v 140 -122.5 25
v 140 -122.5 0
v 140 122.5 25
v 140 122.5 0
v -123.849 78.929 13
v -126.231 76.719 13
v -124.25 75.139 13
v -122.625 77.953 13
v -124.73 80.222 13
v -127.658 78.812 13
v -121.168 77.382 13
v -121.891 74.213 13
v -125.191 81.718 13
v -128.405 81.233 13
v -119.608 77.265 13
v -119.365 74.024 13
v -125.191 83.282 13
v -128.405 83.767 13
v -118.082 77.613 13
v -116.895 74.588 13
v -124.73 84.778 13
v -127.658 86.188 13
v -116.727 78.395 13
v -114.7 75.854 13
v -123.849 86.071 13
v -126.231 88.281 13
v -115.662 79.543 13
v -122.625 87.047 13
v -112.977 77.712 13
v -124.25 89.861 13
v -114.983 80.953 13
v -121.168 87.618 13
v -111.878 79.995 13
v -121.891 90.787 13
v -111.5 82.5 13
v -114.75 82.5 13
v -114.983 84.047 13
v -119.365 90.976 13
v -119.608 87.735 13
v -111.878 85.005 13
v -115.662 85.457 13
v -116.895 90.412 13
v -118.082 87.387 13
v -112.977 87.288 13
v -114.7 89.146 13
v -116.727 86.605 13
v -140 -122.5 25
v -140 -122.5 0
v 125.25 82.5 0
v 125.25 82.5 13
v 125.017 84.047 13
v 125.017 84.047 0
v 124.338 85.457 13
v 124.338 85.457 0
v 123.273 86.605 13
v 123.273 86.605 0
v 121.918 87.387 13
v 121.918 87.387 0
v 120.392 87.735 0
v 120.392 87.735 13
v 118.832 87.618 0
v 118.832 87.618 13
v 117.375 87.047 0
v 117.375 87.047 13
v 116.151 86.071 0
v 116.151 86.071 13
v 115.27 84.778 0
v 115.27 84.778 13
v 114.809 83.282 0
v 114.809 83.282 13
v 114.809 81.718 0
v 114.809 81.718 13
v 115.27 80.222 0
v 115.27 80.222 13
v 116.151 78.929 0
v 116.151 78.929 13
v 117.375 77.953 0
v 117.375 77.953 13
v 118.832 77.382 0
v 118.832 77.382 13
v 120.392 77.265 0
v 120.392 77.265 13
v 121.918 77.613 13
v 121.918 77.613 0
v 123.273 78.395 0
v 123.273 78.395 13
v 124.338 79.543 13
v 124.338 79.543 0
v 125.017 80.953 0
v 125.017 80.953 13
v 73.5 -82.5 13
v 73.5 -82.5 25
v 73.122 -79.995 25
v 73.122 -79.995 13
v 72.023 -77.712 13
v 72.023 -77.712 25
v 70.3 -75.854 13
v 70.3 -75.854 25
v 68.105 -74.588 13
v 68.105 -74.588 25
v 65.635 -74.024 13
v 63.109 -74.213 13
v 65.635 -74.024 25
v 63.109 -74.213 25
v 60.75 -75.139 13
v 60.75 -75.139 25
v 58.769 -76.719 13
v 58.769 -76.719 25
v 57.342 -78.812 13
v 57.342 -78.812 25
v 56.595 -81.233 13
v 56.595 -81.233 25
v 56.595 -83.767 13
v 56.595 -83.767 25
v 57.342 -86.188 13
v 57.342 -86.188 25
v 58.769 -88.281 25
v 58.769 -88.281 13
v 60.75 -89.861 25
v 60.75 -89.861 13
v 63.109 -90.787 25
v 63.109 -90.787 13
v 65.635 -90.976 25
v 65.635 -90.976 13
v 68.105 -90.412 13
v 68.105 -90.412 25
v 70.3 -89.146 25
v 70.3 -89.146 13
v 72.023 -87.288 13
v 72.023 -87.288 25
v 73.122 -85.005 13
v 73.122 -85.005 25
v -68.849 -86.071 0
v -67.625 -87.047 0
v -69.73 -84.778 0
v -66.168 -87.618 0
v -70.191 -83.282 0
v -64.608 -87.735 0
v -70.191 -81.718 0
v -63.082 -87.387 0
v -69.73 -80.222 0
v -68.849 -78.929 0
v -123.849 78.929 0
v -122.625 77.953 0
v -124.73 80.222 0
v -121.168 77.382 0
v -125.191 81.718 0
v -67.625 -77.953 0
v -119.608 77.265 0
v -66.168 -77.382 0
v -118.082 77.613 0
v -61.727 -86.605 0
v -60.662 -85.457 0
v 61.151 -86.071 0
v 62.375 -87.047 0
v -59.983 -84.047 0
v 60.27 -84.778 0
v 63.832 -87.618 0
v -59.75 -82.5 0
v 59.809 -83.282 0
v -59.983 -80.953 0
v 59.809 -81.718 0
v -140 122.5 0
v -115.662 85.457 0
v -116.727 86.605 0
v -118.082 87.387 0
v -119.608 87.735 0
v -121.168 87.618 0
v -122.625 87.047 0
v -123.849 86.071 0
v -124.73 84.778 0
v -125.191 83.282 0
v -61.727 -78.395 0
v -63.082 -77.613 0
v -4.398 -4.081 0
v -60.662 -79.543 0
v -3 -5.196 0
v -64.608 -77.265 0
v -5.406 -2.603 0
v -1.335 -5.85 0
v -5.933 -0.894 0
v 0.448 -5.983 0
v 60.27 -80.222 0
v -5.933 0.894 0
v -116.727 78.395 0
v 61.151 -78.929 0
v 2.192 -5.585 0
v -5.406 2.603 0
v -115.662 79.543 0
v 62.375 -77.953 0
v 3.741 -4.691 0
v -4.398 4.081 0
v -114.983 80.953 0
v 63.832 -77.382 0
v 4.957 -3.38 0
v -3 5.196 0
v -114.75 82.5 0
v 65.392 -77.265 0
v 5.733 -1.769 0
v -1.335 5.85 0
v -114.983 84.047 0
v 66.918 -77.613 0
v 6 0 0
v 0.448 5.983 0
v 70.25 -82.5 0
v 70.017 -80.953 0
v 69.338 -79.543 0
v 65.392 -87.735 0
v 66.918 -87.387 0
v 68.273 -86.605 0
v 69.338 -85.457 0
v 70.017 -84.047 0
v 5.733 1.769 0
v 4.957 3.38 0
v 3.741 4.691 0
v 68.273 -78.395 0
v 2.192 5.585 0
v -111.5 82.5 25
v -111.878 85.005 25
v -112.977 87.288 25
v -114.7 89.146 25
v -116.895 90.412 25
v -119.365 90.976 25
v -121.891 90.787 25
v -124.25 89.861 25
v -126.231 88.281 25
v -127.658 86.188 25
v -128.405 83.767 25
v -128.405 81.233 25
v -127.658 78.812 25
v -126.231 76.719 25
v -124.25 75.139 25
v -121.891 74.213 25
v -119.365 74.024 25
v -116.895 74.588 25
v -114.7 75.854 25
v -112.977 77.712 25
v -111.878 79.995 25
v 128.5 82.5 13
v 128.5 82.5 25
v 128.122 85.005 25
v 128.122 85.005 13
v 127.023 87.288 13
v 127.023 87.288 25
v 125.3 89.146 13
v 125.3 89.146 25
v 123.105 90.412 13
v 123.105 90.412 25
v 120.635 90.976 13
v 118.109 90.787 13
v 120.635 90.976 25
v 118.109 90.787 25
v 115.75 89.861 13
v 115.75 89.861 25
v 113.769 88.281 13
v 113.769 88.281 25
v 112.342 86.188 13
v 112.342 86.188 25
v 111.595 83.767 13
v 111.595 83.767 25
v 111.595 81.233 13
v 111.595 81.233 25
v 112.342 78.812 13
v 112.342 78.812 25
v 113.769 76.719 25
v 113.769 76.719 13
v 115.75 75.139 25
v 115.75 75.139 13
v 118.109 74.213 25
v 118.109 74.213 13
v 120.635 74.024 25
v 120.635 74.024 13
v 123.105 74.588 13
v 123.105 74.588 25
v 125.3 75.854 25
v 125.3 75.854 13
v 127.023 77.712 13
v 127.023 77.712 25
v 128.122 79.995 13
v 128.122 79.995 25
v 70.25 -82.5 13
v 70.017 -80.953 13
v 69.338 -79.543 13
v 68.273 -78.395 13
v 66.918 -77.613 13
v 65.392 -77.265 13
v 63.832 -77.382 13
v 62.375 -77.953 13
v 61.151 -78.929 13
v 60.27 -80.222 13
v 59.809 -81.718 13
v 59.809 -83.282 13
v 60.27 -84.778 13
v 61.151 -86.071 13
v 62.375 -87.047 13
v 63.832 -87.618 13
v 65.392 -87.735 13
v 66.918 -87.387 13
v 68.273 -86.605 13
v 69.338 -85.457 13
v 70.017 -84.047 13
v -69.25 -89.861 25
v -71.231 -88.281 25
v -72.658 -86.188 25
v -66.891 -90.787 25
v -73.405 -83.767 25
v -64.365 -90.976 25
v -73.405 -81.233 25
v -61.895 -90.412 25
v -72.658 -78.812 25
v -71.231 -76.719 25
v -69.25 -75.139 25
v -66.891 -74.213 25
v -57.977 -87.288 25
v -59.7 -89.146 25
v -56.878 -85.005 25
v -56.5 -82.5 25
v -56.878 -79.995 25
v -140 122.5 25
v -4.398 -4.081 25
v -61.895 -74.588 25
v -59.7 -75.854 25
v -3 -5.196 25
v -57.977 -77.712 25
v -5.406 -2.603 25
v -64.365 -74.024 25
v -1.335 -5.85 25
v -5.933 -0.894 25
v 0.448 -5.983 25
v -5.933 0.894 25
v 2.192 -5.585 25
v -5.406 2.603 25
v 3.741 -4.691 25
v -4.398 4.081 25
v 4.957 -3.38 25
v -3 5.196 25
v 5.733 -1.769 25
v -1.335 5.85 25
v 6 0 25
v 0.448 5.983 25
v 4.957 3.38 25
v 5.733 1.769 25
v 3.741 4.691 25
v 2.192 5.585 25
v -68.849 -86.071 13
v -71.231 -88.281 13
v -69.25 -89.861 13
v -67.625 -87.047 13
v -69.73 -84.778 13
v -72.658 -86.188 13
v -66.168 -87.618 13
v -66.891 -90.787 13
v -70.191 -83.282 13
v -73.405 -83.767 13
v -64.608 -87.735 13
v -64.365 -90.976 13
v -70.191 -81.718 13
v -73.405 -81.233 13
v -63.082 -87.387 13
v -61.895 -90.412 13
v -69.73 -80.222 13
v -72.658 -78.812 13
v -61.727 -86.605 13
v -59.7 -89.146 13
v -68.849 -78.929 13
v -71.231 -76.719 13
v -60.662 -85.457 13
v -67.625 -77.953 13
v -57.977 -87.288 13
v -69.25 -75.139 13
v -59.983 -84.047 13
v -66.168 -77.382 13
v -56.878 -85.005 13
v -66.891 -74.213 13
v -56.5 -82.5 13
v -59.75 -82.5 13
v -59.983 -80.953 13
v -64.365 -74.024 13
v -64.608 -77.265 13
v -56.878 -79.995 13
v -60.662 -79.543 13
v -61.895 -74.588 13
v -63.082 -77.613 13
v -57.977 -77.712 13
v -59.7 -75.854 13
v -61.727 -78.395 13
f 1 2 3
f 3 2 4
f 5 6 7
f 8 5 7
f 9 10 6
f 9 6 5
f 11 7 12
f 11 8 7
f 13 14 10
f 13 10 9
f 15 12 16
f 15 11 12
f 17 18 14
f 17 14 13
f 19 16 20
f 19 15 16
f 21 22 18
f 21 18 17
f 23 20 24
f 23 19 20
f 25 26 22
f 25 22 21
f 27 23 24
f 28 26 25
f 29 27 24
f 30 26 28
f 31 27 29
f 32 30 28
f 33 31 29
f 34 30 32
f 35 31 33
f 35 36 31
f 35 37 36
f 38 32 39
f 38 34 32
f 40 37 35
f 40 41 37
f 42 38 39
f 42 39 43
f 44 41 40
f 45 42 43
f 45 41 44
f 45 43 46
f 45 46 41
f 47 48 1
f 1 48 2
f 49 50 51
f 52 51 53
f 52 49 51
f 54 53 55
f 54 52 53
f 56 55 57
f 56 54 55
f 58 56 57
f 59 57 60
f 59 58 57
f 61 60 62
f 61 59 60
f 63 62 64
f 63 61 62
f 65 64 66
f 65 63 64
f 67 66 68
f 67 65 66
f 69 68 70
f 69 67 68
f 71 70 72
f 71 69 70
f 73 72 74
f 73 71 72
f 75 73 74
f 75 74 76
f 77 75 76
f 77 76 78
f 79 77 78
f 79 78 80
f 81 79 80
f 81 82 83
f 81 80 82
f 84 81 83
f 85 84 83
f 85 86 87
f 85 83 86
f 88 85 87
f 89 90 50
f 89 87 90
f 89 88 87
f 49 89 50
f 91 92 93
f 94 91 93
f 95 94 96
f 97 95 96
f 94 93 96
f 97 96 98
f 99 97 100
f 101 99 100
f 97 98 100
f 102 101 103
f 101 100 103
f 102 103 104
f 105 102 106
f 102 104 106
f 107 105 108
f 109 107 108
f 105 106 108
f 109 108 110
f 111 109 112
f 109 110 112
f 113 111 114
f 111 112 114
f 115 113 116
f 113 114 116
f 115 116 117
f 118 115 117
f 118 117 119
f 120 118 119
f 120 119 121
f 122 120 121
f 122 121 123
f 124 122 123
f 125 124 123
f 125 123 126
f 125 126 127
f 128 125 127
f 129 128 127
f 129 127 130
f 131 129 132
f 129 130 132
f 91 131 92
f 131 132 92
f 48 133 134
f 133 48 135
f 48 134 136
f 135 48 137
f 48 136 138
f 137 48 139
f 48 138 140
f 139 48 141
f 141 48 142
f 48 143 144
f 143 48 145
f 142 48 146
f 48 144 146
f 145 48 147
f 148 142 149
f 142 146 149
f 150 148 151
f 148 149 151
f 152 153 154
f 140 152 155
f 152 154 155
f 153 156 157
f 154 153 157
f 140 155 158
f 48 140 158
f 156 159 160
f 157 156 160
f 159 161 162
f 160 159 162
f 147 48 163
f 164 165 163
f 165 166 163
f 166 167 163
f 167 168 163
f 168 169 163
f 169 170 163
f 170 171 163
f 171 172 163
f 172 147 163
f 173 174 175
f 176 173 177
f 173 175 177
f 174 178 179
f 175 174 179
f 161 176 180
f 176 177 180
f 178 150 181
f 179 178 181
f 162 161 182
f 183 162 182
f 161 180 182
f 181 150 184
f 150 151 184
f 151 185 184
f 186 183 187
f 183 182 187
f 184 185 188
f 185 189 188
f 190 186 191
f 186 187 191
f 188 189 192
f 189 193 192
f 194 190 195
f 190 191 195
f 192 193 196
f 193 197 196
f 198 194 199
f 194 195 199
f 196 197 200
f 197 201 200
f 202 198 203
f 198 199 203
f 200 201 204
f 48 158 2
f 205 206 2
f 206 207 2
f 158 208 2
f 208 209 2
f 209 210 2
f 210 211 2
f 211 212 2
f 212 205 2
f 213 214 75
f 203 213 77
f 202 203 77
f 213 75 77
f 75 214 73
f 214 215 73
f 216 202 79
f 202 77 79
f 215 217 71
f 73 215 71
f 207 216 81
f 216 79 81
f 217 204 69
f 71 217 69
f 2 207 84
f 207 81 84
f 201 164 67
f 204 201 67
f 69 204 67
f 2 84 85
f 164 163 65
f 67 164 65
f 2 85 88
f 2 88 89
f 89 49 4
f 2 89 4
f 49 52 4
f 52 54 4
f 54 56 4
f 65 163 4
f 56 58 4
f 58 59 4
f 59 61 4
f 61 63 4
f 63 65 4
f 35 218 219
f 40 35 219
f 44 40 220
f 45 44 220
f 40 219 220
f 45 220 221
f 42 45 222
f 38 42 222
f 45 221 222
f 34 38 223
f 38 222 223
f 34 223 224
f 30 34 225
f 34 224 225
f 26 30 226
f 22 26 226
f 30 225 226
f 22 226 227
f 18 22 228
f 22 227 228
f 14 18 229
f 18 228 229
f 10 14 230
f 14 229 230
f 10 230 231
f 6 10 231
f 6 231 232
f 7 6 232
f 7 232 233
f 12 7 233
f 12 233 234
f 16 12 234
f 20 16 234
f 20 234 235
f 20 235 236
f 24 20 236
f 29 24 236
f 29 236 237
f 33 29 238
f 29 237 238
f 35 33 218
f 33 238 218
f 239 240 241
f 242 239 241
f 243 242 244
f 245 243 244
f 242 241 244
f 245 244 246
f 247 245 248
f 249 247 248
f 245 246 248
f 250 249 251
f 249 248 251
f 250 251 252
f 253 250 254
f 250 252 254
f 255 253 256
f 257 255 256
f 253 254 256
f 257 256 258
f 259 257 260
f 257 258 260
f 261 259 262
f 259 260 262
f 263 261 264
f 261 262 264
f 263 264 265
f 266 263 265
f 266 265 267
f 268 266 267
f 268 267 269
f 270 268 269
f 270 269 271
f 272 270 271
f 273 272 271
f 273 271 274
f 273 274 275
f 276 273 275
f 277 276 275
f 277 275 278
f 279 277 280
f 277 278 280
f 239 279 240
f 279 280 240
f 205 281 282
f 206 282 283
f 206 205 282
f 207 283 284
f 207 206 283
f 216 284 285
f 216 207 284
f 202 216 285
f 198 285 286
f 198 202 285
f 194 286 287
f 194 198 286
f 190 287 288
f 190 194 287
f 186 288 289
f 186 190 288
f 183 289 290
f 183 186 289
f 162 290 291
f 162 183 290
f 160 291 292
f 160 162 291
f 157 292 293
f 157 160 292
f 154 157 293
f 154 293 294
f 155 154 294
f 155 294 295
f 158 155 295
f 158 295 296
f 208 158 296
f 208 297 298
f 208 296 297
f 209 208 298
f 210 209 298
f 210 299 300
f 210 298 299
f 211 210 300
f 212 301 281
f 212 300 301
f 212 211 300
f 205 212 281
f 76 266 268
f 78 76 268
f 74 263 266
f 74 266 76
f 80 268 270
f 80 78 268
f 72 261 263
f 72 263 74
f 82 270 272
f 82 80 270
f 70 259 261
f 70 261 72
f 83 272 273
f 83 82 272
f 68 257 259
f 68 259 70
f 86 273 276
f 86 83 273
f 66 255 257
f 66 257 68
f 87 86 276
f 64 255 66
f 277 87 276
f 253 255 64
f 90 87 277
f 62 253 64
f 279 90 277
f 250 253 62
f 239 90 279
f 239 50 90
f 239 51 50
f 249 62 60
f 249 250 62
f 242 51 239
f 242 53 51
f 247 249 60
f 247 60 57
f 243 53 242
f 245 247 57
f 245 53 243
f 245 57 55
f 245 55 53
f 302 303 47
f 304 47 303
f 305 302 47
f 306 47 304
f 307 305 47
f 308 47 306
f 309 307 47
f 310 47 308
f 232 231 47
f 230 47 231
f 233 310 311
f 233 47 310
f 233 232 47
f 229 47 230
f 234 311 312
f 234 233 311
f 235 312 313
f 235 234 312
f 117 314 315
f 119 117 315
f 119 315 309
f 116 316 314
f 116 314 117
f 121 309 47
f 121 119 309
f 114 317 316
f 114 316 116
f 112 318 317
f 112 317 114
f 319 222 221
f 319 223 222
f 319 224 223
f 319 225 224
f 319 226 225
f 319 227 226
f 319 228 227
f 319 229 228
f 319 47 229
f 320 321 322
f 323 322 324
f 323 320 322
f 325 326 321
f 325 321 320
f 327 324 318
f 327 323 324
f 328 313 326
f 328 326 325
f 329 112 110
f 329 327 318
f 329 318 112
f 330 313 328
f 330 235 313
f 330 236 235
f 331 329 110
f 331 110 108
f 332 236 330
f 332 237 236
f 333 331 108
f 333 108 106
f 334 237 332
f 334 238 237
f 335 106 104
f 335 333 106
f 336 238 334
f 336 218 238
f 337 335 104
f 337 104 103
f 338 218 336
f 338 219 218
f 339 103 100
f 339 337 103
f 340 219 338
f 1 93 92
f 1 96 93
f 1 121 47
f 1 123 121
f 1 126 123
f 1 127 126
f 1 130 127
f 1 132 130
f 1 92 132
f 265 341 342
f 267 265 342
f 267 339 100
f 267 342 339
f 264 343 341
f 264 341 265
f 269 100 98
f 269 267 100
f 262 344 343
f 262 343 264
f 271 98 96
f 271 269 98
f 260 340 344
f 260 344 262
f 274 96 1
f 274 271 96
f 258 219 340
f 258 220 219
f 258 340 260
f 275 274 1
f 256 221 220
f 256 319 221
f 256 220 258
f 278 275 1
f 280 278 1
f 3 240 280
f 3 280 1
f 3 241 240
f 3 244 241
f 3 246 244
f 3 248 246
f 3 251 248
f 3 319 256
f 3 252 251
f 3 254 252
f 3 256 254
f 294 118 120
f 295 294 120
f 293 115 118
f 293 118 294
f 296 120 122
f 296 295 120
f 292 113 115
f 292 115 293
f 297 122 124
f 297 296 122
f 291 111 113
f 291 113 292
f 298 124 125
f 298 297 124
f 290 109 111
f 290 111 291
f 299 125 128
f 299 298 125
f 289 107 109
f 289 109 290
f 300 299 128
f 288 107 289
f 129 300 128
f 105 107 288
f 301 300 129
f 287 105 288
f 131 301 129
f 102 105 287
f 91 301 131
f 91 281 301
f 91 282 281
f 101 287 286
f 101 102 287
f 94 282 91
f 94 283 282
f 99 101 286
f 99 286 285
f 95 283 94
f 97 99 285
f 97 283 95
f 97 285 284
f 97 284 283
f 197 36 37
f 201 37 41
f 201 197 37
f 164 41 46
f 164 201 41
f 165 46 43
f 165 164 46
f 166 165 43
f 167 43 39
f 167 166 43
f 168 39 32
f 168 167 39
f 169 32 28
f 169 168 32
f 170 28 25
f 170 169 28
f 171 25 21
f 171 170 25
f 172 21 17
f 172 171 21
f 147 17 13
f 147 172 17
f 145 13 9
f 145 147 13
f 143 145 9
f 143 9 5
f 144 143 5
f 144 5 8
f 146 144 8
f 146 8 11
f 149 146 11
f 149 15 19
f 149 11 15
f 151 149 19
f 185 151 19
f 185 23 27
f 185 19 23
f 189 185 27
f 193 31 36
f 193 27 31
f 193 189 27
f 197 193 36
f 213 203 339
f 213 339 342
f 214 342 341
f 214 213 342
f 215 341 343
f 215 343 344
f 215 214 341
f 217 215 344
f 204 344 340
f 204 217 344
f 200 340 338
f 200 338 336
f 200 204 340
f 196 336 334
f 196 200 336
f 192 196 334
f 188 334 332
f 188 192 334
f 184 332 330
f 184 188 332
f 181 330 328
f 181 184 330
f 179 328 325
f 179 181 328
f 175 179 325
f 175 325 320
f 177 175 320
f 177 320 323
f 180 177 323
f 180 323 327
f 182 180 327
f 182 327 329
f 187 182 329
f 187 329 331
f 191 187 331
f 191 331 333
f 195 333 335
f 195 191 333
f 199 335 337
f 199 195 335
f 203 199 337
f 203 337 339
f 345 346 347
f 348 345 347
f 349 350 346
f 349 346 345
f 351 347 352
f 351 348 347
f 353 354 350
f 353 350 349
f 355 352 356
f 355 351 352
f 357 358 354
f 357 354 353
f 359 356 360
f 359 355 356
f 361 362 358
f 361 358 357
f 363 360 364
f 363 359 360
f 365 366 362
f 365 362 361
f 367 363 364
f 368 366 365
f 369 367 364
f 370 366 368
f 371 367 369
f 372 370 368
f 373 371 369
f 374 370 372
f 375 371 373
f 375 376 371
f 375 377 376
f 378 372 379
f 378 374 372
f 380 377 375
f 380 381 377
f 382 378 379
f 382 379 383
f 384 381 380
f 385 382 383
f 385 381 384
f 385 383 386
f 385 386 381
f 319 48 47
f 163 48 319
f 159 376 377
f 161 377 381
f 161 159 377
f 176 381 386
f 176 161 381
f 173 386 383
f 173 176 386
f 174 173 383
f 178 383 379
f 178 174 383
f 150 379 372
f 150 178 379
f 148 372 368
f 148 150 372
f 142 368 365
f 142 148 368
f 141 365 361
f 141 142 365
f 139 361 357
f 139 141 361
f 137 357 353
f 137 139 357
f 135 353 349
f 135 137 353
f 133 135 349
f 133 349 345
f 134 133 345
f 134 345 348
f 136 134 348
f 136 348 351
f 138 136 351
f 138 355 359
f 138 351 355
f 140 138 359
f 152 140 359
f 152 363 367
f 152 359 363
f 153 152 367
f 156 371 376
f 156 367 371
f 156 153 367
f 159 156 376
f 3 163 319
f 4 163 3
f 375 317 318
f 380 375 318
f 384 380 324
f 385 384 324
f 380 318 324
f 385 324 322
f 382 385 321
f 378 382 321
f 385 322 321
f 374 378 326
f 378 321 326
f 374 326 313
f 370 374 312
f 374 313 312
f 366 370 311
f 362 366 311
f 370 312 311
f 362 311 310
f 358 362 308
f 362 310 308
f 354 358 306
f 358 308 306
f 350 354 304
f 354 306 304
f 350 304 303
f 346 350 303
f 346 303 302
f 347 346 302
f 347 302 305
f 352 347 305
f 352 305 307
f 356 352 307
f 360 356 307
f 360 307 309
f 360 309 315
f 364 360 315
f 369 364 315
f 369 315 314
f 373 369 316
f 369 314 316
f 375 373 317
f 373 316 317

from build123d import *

# Parameters (mm, degrees)
SKETCH1_W           = 280
SKETCH1_H           = 245
SKETCH1_R           = 5.25
SKETCH1_R_2         = 6
BOSS_EXTRUDE1_DEPTH = 25
SKETCH2_R           = 8.5
CUT_EXTRUDE1_DEPTH  = 12


with BuildPart() as part:
    # Sketch1 → Boss-Extrude1 (new body)
    with BuildSketch(Plane.XY):
        Rectangle(SKETCH1_W, SKETCH1_H)
        with Locations((-120, 82.5)):
            Circle(SKETCH1_R, mode=Mode.SUBTRACT)
        with Locations((120, 82.5)):
            Circle(SKETCH1_R, mode=Mode.SUBTRACT)
        with Locations((-65, -82.5)):
            Circle(SKETCH1_R, mode=Mode.SUBTRACT)
        with Locations((65, -82.5)):
            Circle(SKETCH1_R, mode=Mode.SUBTRACT)
        Circle(SKETCH1_R_2, mode=Mode.SUBTRACT)
    extrude(amount=BOSS_EXTRUDE1_DEPTH)

    # Sketch2 → Cut-Extrude1 (cut)
    with BuildSketch(Plane.XY.offset(25)):
        with Locations((-120, 82.5)):
            Circle(SKETCH2_R)
        with Locations((120, 82.5)):
            Circle(SKETCH2_R)
        with Locations((65, -82.5)):
            Circle(SKETCH2_R)
        with Locations((-65, -82.5)):
            Circle(SKETCH2_R)
    extrude(amount=-CUT_EXTRUDE1_DEPTH, mode=Mode.SUBTRACT)


solid = part.part
